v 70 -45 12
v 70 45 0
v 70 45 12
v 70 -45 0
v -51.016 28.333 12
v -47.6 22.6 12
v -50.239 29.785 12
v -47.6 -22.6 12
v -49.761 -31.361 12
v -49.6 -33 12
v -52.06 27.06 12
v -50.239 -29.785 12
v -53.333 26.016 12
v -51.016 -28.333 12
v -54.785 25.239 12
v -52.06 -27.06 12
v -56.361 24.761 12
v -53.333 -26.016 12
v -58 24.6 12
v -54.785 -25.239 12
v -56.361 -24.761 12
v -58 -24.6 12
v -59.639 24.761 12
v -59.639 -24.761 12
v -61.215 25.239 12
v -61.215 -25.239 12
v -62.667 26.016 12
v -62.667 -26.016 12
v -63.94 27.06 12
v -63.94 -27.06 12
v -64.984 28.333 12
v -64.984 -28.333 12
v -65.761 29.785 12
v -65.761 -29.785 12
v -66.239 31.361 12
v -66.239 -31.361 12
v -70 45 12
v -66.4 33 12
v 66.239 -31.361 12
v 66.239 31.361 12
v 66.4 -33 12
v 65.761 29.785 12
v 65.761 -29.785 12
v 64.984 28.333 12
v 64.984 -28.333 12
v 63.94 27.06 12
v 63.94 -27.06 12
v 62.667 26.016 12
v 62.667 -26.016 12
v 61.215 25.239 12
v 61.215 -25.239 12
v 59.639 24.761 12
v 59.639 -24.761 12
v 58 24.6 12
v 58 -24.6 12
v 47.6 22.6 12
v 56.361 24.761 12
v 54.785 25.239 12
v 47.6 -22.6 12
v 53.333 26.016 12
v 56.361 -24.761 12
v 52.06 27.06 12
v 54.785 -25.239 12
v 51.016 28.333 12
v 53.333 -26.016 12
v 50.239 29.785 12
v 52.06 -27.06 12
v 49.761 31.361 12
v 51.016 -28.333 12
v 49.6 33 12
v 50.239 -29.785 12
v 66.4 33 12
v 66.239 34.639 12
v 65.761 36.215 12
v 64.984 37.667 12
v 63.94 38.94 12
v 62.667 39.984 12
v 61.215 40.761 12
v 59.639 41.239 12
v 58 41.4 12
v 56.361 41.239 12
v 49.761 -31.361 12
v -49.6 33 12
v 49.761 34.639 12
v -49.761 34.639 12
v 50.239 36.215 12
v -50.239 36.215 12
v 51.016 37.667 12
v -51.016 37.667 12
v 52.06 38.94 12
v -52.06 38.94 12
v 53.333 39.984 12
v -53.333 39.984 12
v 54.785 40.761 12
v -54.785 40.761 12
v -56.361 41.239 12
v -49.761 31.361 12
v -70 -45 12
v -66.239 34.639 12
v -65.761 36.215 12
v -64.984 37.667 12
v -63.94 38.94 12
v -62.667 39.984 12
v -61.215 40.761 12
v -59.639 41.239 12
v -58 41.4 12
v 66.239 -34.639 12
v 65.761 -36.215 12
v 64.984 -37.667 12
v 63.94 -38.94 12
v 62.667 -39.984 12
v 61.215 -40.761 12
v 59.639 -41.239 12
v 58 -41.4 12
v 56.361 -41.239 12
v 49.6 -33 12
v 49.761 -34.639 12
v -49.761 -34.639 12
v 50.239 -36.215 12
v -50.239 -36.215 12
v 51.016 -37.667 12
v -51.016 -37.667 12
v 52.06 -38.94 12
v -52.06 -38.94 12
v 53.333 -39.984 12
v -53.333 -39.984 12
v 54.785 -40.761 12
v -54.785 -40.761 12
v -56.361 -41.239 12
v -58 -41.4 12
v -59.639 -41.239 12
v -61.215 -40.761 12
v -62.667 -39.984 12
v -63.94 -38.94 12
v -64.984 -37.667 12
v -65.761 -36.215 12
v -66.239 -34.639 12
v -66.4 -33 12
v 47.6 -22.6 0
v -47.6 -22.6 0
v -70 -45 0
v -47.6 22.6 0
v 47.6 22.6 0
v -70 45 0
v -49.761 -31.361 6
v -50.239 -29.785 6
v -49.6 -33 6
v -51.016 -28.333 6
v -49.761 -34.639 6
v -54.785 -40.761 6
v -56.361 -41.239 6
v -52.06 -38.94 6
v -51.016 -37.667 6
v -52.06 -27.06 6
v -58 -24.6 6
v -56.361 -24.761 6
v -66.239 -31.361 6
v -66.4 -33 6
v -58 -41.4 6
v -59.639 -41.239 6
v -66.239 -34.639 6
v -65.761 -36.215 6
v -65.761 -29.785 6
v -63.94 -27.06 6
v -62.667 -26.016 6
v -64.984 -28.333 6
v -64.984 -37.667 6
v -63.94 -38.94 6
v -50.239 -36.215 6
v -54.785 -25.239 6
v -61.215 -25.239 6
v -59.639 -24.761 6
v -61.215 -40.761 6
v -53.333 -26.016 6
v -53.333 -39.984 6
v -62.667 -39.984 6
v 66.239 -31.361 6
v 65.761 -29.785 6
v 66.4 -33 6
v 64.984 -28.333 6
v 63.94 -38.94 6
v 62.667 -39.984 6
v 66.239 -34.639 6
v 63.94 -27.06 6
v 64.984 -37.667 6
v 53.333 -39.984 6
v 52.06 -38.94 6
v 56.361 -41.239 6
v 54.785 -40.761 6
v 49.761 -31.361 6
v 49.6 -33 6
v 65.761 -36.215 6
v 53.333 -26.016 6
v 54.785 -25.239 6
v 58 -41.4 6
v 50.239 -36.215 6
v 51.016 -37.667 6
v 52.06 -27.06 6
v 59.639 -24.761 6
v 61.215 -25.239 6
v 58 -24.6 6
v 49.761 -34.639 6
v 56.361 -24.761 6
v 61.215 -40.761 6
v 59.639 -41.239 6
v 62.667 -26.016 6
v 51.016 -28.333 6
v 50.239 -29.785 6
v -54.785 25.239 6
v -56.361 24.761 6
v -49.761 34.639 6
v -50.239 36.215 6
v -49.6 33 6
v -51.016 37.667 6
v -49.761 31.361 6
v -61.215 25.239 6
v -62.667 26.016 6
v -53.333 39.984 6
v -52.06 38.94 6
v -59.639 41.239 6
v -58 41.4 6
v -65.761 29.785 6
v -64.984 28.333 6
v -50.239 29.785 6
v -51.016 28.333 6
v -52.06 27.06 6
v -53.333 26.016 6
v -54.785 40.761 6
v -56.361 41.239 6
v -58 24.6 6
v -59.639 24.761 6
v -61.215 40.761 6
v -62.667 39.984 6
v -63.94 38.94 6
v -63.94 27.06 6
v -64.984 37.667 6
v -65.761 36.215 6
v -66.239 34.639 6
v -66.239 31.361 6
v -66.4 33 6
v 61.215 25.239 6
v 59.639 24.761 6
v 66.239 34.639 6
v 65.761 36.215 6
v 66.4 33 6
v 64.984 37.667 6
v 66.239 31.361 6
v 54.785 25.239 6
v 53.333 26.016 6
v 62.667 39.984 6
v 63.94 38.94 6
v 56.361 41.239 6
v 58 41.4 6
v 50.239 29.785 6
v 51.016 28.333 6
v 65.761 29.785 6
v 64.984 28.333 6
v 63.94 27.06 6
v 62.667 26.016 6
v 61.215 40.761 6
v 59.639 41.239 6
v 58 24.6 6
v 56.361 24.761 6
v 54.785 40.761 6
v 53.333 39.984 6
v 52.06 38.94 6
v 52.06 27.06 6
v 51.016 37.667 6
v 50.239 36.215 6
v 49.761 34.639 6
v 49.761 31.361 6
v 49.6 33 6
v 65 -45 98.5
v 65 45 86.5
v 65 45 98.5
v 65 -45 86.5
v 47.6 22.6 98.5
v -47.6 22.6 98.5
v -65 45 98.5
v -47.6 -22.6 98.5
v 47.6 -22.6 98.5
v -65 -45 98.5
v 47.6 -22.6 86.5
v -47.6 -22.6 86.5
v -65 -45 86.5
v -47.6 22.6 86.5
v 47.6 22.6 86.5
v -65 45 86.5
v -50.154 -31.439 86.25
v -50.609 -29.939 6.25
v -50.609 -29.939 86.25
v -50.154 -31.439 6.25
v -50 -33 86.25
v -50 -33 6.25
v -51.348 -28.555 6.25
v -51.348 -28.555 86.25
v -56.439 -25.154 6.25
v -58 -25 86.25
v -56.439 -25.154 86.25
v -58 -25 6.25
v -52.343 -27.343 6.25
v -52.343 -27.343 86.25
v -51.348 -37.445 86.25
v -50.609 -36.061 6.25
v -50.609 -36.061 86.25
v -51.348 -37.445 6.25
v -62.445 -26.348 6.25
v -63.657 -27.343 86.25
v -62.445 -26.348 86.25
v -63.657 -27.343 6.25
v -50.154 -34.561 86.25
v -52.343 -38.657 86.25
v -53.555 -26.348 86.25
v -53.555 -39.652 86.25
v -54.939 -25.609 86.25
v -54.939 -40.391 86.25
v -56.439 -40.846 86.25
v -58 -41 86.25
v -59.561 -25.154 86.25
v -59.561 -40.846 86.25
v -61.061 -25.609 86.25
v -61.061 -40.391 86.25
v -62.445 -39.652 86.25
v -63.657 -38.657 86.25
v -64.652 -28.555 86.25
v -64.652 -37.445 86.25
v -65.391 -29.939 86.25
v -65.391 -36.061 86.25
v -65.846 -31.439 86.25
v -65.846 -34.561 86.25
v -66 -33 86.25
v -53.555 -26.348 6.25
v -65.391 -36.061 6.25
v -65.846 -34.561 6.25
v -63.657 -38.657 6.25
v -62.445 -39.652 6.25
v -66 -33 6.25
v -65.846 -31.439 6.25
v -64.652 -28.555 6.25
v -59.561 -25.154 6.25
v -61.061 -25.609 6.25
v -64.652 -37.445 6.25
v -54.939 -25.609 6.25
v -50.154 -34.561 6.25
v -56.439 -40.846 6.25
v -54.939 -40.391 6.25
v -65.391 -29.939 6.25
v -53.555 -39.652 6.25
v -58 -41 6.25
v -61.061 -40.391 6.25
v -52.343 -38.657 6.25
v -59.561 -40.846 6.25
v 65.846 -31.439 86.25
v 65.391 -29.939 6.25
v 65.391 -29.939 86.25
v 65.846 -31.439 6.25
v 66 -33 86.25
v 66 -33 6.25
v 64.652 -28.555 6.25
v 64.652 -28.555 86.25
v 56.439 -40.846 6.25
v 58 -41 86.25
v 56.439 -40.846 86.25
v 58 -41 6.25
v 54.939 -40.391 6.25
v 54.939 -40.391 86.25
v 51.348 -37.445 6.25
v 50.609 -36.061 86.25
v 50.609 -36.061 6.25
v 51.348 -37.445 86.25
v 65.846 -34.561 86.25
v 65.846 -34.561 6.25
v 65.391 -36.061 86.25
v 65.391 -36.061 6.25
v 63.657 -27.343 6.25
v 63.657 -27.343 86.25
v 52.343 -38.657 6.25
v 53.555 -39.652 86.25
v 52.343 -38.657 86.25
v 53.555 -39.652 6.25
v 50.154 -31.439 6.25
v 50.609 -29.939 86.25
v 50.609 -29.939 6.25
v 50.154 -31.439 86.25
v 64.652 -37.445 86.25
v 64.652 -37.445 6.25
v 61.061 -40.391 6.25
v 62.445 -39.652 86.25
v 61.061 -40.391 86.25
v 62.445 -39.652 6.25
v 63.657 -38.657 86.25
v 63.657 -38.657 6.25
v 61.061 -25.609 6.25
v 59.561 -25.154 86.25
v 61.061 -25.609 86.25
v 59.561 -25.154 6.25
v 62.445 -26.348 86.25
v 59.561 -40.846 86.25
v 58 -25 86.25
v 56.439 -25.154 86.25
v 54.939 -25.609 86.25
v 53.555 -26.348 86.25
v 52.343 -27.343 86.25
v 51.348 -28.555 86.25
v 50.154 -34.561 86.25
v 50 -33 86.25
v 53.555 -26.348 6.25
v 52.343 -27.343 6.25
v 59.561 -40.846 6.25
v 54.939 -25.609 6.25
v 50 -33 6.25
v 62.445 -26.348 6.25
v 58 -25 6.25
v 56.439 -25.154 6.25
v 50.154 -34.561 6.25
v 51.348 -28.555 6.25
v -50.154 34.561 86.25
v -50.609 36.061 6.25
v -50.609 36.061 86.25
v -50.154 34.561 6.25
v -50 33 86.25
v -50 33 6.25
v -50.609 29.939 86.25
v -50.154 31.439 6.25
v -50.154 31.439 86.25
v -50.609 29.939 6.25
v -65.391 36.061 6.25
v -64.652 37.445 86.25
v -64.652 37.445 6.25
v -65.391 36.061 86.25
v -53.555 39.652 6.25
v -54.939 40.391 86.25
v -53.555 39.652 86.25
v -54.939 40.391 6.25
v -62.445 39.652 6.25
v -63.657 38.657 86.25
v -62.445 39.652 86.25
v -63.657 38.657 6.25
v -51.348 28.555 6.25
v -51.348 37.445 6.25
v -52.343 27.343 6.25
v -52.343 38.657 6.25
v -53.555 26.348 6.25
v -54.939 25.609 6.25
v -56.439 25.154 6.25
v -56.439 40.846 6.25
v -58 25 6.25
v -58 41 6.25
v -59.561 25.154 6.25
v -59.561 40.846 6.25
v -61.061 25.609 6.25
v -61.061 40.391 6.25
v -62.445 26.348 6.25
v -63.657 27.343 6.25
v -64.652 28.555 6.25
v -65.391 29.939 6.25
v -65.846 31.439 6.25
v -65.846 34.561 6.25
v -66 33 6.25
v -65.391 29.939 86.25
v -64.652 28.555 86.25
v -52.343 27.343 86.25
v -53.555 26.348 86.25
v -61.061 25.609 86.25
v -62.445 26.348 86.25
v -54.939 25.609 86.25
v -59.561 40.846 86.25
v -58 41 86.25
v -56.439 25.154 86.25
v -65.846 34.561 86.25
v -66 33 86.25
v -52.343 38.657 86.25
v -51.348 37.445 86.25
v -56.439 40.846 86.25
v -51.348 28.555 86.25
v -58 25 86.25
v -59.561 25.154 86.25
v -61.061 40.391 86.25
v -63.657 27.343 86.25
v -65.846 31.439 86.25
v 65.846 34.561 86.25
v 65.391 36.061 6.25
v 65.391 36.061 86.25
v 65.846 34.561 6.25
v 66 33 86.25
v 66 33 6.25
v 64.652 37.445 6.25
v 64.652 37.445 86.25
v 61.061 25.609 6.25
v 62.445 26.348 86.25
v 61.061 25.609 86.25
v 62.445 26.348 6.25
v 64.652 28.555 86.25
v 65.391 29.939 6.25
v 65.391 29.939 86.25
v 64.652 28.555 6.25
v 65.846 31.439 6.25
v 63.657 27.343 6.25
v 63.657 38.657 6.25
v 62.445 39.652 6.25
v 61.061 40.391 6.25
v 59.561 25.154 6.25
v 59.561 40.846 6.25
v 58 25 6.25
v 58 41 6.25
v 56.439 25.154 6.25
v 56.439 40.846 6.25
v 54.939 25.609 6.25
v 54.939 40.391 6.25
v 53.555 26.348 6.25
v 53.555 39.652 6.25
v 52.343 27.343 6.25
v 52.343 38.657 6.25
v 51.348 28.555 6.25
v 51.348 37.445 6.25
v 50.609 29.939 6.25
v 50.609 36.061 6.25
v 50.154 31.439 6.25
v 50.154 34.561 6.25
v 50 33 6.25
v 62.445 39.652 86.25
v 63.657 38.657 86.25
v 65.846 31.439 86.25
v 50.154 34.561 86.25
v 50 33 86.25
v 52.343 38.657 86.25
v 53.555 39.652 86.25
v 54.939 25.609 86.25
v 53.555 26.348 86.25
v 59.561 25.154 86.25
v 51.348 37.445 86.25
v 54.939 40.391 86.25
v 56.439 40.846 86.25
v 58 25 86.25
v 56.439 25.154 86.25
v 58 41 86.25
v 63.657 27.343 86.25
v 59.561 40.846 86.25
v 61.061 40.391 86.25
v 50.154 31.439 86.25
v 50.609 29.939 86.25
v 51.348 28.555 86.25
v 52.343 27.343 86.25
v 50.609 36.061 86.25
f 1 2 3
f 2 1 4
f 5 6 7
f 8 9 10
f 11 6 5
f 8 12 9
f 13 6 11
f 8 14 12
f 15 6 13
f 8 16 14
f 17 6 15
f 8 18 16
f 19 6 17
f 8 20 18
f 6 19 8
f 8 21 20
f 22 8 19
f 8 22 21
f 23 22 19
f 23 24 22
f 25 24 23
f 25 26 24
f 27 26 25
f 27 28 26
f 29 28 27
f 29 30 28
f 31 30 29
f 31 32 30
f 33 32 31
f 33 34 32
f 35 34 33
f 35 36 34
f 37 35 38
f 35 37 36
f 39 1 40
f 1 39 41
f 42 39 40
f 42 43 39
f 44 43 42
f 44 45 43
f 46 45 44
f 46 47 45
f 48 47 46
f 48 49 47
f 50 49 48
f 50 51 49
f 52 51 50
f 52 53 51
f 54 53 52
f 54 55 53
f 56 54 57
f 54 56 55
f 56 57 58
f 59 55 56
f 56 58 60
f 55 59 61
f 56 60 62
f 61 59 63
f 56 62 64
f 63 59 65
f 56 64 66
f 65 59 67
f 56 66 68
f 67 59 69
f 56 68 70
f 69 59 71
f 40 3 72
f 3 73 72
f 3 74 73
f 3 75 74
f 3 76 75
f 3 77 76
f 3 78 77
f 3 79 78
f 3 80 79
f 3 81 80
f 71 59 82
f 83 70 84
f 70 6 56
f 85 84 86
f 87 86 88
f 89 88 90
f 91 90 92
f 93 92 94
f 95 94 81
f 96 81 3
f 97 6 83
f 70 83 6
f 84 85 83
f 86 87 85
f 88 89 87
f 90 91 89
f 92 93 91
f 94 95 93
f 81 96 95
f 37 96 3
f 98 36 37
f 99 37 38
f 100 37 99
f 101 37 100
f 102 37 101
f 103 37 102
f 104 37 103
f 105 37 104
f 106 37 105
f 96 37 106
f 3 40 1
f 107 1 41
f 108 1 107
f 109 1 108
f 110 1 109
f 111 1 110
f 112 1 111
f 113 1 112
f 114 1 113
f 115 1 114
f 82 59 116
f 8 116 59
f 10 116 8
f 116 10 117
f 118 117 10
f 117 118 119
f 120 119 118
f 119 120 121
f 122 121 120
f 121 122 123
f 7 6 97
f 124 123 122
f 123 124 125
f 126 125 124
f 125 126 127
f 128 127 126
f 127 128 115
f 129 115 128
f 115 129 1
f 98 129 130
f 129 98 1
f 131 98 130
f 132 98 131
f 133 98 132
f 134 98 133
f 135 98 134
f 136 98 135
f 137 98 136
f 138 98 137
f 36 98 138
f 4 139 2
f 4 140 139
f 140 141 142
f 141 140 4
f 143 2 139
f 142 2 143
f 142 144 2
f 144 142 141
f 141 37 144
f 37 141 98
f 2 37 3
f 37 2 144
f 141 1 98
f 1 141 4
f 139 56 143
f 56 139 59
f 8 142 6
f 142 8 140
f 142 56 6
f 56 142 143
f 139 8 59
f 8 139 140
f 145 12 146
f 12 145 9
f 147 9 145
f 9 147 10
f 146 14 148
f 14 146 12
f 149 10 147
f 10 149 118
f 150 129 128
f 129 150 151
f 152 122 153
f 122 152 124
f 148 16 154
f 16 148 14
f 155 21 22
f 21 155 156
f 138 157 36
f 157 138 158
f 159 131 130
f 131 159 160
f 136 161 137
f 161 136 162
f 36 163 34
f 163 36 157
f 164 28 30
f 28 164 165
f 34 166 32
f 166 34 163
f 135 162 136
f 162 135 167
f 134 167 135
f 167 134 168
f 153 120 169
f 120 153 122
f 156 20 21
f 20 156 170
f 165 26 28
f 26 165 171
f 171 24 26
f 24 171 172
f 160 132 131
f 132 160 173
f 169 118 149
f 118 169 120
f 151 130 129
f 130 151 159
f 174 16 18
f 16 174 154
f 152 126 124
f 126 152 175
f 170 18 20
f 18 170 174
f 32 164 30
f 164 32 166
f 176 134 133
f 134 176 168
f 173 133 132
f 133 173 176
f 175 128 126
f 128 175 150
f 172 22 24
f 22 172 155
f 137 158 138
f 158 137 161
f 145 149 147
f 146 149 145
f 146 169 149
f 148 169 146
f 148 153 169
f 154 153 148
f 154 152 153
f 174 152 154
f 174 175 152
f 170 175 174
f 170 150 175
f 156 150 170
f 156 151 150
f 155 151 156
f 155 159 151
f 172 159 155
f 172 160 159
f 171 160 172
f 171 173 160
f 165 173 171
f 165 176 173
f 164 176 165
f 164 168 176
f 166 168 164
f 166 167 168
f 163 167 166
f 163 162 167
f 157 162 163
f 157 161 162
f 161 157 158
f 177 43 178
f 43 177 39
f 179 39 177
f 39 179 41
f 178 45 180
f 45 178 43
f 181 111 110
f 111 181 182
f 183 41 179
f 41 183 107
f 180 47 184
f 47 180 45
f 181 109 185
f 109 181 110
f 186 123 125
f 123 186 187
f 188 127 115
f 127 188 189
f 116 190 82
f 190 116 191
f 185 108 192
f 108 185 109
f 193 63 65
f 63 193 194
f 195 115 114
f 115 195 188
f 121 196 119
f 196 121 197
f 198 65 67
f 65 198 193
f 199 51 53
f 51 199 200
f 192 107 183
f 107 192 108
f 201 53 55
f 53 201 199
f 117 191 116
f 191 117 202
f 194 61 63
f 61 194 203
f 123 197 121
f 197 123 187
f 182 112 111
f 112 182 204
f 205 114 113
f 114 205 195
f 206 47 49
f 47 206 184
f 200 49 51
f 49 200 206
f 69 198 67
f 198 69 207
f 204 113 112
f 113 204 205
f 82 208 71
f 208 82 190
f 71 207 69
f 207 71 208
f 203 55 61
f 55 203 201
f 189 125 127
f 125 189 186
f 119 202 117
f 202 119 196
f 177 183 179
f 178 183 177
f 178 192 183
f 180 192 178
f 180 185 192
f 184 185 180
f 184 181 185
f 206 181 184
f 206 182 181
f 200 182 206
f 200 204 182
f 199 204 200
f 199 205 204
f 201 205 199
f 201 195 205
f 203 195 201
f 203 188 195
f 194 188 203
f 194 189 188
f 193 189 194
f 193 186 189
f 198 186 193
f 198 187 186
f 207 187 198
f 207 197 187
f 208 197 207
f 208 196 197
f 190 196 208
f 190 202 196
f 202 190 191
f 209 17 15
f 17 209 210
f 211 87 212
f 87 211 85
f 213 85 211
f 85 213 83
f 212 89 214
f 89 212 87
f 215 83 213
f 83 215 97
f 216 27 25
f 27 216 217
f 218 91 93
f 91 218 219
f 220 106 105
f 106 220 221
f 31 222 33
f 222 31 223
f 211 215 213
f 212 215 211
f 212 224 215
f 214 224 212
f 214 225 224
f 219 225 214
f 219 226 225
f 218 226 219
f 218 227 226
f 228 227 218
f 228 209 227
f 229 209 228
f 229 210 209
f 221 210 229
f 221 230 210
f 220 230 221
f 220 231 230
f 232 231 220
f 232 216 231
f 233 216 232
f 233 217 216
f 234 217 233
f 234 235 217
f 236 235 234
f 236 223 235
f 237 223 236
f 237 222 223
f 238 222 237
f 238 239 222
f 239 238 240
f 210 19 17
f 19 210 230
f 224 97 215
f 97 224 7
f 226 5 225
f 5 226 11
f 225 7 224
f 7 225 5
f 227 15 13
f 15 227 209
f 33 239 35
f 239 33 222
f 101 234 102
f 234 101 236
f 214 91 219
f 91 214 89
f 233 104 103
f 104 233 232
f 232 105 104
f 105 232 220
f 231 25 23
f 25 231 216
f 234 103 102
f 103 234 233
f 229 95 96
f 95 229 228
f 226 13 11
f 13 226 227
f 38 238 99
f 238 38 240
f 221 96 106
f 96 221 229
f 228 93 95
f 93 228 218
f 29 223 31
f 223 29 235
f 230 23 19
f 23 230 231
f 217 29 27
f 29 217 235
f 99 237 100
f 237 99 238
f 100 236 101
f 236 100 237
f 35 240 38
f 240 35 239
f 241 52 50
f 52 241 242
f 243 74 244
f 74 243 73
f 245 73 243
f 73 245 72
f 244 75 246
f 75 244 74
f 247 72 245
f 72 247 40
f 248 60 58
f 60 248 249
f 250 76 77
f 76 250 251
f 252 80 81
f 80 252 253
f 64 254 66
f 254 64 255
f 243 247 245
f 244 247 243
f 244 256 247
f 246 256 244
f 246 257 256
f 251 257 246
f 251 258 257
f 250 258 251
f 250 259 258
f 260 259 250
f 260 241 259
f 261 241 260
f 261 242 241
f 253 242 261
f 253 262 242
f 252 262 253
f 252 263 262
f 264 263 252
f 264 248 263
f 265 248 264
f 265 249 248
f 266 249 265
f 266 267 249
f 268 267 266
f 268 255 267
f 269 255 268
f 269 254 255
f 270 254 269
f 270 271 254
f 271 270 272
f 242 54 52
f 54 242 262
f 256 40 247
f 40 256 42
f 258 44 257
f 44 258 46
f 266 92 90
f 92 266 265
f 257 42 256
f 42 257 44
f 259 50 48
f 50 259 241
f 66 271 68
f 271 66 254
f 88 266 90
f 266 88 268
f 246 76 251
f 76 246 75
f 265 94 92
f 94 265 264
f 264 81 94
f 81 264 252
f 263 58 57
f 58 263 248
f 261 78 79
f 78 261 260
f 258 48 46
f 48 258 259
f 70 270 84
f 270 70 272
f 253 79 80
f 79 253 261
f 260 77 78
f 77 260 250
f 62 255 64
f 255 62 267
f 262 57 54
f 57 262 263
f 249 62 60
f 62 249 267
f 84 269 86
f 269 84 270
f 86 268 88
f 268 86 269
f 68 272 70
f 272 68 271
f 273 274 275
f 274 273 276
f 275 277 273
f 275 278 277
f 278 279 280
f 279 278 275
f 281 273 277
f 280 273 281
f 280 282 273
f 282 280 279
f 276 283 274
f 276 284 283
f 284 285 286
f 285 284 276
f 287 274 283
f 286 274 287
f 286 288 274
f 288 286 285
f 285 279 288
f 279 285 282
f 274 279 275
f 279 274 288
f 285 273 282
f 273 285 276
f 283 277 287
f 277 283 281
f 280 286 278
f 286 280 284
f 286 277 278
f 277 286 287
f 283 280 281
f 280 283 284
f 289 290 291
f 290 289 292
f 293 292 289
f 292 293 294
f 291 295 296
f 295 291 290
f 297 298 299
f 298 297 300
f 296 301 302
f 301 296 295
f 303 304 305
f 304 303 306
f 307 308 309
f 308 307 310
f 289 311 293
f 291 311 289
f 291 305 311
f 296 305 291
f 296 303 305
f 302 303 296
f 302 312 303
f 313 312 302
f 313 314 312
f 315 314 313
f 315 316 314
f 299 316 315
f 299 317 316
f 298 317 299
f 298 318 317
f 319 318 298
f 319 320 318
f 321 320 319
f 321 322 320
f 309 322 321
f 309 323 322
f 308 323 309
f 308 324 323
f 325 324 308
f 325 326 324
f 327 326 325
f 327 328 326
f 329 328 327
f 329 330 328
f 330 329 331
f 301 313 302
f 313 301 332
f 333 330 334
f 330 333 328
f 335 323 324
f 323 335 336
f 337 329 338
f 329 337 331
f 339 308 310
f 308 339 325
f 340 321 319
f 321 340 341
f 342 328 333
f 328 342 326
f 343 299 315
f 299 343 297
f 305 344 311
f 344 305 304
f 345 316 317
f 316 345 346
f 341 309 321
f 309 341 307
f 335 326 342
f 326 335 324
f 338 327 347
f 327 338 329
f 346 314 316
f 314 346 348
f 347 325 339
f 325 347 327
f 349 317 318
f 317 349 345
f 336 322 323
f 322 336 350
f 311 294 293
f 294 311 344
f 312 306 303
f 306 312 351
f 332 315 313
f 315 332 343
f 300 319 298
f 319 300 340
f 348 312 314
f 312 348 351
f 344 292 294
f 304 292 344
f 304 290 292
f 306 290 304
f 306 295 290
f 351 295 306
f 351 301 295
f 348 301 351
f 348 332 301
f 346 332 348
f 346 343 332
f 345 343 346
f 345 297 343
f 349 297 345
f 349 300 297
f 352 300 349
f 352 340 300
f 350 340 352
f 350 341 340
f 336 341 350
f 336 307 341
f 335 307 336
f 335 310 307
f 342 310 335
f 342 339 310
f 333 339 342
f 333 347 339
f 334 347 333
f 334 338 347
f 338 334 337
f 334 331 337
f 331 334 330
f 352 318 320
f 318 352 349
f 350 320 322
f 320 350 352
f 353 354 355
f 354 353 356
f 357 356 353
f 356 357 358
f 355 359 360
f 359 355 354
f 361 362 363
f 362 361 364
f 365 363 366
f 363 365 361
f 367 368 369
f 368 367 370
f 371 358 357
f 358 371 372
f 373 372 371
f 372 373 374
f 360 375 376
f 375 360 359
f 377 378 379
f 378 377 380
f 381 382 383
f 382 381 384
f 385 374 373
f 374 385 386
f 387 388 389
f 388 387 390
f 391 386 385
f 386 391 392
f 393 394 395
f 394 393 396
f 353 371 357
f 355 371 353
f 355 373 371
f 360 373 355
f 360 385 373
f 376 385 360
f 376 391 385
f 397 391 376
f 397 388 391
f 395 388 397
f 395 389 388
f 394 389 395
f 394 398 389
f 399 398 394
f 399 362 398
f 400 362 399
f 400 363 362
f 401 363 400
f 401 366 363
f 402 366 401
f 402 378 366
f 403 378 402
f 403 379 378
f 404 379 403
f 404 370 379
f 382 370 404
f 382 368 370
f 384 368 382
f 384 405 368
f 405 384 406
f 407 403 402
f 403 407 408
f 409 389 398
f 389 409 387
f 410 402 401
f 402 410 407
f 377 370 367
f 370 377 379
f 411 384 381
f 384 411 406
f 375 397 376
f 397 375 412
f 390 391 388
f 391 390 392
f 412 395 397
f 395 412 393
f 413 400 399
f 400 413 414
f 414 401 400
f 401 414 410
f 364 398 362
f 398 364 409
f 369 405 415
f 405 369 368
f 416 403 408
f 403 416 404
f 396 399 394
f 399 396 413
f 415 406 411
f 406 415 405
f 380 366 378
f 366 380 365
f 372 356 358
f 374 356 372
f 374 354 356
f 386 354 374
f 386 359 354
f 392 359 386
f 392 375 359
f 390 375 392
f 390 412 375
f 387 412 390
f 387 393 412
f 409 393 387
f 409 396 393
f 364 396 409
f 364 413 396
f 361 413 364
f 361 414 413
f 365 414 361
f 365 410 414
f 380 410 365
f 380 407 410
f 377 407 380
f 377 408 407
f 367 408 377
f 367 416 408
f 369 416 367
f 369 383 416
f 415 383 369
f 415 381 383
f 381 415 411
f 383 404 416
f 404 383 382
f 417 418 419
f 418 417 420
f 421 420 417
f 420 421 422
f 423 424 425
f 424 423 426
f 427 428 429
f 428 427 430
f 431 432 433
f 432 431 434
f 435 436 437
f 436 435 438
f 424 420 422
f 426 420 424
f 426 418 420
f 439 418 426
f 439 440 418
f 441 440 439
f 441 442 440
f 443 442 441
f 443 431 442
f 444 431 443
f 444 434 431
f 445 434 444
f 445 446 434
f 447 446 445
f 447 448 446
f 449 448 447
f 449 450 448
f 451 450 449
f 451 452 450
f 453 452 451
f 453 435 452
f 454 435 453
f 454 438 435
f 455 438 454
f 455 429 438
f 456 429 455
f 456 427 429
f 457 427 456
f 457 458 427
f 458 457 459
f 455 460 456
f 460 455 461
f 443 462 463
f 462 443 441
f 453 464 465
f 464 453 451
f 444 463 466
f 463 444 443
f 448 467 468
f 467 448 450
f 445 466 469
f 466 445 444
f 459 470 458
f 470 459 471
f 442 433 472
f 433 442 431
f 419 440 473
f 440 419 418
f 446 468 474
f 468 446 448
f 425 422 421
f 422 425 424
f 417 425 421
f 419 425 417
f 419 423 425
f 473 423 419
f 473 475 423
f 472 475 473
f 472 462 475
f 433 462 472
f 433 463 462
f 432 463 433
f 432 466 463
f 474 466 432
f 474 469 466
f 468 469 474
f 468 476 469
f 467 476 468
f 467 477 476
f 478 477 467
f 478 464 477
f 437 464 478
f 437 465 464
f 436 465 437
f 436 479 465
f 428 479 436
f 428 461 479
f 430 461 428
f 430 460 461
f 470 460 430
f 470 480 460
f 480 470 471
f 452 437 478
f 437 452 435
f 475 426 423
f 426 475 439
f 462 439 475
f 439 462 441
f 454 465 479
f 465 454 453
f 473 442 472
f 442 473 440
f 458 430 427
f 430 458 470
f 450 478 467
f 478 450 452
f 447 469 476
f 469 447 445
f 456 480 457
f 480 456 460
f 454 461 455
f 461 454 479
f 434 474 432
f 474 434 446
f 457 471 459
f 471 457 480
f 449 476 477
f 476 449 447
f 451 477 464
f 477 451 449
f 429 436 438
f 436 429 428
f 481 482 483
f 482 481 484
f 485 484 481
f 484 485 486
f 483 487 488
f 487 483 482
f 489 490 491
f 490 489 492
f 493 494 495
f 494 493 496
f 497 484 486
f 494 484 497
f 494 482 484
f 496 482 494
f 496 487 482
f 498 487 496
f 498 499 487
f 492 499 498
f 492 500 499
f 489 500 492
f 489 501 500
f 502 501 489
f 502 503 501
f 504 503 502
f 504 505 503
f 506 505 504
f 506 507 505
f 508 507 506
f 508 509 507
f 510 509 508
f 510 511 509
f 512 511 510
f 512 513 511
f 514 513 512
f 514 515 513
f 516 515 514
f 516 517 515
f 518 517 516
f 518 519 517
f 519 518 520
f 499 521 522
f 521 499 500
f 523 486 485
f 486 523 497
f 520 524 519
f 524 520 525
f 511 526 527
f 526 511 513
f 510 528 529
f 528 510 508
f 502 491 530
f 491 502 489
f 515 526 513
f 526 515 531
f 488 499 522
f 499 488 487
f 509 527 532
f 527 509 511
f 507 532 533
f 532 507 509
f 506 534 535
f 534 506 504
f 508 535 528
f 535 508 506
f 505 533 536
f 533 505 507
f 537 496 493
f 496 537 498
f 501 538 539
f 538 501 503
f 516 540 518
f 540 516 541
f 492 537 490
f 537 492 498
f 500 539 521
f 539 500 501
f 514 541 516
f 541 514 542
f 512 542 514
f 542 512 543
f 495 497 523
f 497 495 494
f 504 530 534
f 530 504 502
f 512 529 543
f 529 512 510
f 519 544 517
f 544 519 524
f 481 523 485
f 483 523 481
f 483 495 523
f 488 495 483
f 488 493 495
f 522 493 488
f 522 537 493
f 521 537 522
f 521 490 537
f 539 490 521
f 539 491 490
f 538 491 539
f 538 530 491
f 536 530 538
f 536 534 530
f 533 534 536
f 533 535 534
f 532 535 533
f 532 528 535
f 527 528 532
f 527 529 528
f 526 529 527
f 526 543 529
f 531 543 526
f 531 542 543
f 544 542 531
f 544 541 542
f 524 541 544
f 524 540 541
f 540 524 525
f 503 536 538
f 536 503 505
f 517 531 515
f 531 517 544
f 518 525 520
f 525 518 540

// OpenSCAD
$fn = 32;

// ------------------------------------------------------------------------
// Frame cube: base 140 x 90 mm, posts 80 mm tall
// Every part is its own module, assembly() places every instance.
// ------------------------------------------------------------------------

// --- part 1 ---
module base_frame() {
  difference() {
    translate([-70, -45, 0]) cube([140, 90, 12]);
    translate([-47.6, -22.6, -1]) cube([95.2, 45.2, 14]);
    translate([-58, -33, 6]) cylinder(h = 7, d = 16.8);
    translate([58, -33, 6]) cylinder(h = 7, d = 16.8);
    translate([-58, 33, 6]) cylinder(h = 7, d = 16.8);
    translate([58, 33, 6]) cylinder(h = 7, d = 16.8);
  }
}

// --- part 2 ---
module corner_post() {
  cylinder(h = 80, d = 16);
}

// --- part 3 ---
module top_frame() {
  difference() {
    translate([-65, -45, 0]) cube([130, 90, 12]);
    translate([-47.6, -22.6, -1]) cube([95.2, 45.2, 14]);
  }
}

// --- assembly ---
module assembly() {
  color([0.80, 0.24, 0.20]) translate([0, 0, 0]) rotate([0, 0, 0]) base_frame();
  color([0.20, 0.45, 0.75]) translate([-58, -33, 6.25]) rotate([0, 0, 0]) corner_post();
  color([0.25, 0.62, 0.32]) translate([58, -33, 6.25]) rotate([0, 0, 0]) corner_post();
  color([0.92, 0.70, 0.18]) translate([-58, 33, 6.25]) rotate([0, 0, 0]) corner_post();
  color([0.58, 0.35, 0.70]) translate([58, 33, 6.25]) rotate([0, 0, 0]) corner_post();
  color([0.16, 0.66, 0.66]) translate([0, 0, 86.5]) rotate([0, 0, 0]) top_frame();
}

assembly();
